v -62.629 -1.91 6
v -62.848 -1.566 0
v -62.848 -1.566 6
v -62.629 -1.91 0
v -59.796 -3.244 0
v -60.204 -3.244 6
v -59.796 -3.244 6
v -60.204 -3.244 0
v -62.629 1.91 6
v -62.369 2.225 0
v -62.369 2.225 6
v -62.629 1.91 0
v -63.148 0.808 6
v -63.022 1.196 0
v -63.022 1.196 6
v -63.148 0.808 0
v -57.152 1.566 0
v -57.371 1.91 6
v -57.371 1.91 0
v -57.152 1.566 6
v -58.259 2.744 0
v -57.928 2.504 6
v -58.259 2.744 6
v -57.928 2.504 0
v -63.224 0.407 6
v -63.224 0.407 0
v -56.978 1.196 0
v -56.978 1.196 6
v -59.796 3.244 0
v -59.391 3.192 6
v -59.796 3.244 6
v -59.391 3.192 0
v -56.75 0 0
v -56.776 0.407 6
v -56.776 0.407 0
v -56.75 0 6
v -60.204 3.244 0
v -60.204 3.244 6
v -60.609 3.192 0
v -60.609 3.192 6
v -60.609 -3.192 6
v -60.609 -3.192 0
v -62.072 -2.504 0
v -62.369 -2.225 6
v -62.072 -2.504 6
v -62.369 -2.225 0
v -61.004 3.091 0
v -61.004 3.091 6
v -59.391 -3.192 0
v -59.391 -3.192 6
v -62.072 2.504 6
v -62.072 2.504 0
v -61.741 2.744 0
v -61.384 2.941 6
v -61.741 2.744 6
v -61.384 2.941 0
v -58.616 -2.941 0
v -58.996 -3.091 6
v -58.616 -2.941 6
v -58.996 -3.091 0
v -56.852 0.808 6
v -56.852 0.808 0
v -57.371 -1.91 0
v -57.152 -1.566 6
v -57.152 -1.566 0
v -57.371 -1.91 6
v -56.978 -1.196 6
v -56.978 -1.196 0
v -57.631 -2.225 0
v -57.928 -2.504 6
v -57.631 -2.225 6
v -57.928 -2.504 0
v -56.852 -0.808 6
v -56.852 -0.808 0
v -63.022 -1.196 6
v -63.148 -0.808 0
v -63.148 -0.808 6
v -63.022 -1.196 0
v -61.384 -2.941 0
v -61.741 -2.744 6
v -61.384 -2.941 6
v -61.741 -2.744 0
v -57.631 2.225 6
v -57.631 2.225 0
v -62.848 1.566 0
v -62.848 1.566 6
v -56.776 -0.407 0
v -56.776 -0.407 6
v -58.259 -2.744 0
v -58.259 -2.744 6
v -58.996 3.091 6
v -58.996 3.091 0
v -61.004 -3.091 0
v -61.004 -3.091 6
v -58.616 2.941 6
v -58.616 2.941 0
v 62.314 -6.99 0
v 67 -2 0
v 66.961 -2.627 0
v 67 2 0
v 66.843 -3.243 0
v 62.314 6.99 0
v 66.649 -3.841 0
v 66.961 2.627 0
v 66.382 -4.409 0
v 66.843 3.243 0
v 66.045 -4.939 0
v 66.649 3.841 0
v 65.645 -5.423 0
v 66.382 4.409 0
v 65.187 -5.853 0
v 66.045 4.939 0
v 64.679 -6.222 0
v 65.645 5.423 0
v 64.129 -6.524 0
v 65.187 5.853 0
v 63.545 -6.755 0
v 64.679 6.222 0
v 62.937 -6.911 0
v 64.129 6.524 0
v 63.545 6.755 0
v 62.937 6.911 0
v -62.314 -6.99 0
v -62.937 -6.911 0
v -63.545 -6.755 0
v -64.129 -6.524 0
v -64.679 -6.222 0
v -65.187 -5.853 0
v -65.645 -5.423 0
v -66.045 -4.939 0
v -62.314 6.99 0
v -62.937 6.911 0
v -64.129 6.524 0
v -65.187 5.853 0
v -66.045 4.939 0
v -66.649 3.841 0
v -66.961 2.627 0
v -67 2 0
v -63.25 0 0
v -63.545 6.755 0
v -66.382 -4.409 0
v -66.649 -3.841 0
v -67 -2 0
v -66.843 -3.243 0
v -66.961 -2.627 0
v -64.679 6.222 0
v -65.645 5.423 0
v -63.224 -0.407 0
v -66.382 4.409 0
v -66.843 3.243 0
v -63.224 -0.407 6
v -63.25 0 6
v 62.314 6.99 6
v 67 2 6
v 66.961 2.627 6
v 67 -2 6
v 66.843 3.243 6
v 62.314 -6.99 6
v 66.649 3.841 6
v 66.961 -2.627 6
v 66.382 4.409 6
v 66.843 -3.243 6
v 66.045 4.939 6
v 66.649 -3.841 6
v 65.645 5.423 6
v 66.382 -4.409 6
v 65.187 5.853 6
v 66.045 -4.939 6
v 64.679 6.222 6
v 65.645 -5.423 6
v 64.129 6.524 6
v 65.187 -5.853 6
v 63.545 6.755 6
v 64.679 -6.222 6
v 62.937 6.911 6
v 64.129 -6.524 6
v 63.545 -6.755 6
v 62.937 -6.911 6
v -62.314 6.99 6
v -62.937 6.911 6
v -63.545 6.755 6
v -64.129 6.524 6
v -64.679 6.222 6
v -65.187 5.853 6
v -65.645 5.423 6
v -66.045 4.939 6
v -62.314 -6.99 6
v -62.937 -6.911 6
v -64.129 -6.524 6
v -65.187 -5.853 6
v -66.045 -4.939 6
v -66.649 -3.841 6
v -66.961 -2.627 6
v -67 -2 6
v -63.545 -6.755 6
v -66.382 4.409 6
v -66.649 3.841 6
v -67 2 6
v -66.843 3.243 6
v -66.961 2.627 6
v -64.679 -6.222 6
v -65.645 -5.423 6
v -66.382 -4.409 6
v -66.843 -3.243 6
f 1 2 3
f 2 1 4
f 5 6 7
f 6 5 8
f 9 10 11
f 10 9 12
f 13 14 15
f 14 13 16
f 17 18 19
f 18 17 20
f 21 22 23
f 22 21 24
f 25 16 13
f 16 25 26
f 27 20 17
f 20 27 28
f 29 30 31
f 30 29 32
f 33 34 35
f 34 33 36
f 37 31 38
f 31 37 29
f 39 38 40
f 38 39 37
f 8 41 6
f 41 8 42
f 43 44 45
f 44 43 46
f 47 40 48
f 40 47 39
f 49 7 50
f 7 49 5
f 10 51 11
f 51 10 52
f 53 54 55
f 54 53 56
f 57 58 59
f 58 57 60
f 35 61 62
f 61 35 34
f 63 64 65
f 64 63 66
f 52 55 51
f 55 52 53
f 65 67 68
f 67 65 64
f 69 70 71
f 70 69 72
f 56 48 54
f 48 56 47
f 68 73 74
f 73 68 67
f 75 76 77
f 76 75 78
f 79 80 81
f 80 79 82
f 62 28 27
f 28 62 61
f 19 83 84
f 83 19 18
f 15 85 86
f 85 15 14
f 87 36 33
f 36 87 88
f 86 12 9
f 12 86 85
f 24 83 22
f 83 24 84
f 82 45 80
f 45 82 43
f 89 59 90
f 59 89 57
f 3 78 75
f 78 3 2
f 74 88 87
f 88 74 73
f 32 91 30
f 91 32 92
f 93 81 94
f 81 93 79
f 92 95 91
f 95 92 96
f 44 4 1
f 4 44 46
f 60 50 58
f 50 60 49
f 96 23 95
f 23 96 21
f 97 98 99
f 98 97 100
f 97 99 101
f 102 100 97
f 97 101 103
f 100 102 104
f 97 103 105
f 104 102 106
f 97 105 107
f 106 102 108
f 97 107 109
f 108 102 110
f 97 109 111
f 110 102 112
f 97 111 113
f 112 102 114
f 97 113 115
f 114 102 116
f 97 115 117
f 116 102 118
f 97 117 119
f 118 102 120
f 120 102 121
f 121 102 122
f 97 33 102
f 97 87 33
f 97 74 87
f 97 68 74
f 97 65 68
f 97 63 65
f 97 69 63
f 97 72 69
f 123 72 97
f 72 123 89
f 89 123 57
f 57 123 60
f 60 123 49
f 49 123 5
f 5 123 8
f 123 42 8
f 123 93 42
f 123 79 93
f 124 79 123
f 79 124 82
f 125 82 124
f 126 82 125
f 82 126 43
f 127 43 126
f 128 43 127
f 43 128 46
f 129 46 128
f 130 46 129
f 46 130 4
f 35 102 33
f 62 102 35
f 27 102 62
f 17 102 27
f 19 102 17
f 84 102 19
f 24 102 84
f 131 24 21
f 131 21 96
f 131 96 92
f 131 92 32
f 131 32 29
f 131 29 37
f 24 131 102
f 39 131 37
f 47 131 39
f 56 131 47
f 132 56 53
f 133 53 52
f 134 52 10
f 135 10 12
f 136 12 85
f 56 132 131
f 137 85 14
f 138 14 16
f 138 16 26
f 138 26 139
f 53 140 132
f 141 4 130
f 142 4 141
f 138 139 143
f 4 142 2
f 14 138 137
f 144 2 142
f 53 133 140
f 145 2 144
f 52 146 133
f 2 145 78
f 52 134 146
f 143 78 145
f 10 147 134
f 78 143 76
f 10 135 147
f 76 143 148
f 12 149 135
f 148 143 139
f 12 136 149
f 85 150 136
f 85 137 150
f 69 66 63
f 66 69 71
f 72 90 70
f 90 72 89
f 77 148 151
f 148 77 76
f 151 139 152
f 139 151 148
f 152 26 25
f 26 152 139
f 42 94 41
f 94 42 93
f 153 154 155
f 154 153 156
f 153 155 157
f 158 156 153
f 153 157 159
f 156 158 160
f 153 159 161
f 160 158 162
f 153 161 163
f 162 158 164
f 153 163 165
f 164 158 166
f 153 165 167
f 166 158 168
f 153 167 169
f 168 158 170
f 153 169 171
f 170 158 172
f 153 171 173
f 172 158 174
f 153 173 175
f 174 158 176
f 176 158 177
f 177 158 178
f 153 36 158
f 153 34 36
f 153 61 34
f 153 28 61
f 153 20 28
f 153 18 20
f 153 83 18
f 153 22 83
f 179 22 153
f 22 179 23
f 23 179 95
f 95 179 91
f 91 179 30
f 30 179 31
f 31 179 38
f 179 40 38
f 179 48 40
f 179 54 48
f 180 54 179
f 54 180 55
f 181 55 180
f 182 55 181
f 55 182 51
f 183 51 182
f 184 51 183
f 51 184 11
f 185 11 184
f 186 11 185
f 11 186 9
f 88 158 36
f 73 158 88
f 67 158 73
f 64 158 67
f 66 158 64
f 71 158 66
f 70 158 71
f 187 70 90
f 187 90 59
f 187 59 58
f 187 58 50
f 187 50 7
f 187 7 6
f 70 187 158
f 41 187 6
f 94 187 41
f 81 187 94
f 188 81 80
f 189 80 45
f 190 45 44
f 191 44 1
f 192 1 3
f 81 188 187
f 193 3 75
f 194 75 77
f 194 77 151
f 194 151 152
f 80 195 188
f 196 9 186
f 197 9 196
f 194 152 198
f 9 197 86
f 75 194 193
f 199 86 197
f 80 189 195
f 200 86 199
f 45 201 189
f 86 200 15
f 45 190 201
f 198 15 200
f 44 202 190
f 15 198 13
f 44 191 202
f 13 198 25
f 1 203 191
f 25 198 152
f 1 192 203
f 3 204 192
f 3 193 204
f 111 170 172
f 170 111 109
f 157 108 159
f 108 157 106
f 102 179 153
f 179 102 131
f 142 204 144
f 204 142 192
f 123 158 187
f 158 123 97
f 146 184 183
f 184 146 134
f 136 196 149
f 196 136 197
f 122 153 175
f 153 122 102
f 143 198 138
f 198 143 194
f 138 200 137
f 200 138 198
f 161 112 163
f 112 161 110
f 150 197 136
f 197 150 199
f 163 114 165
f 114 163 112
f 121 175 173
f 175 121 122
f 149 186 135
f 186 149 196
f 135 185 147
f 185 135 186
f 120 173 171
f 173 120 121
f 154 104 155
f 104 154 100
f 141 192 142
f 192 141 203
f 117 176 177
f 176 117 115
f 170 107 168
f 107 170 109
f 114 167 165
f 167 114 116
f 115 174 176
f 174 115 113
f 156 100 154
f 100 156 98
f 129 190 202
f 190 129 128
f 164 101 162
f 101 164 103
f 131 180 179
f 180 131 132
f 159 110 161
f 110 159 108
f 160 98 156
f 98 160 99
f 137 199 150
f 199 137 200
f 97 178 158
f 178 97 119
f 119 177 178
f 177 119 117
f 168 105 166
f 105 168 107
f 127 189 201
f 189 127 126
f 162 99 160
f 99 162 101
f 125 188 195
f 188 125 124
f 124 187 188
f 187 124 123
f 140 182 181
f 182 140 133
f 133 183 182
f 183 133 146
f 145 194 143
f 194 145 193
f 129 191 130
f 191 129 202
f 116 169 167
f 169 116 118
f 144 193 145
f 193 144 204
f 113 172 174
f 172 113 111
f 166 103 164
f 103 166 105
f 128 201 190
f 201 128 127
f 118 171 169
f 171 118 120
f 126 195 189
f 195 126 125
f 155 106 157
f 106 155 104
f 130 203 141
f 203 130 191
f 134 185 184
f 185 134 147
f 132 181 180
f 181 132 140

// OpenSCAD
$fn = 50;


difference() {
	union() {
		hull() {
			translate(v = [-62.0000000000, 2.0000000000, 0]) {
				cylinder(h = 6, r = 5);
			}
			translate(v = [62.0000000000, 2.0000000000, 0]) {
				cylinder(h = 6, r = 5);
			}
			translate(v = [-62.0000000000, -2.0000000000, 0]) {
				cylinder(h = 6, r = 5);
			}
			translate(v = [62.0000000000, -2.0000000000, 0]) {
				cylinder(h = 6, r = 5);
			}
		}
	}
	union() {
		translate(v = [-60.0000000000, 0.0000000000, 0]) {
			cylinder(h = 6, r = 3.2500000000);
		}
		translate(v = [-60.0000000000, 0.0000000000, 0]) {
			cylinder(h = 6, r = 1.8000000000);
		}
		translate(v = [-60.0000000000, 0.0000000000, 0]) {
			cylinder(h = 6, r = 1.8000000000);
		}
		translate(v = [-60.0000000000, 0.0000000000, 0]) {
			cylinder(h = 6, r = 1.8000000000);
		}
	}
}
